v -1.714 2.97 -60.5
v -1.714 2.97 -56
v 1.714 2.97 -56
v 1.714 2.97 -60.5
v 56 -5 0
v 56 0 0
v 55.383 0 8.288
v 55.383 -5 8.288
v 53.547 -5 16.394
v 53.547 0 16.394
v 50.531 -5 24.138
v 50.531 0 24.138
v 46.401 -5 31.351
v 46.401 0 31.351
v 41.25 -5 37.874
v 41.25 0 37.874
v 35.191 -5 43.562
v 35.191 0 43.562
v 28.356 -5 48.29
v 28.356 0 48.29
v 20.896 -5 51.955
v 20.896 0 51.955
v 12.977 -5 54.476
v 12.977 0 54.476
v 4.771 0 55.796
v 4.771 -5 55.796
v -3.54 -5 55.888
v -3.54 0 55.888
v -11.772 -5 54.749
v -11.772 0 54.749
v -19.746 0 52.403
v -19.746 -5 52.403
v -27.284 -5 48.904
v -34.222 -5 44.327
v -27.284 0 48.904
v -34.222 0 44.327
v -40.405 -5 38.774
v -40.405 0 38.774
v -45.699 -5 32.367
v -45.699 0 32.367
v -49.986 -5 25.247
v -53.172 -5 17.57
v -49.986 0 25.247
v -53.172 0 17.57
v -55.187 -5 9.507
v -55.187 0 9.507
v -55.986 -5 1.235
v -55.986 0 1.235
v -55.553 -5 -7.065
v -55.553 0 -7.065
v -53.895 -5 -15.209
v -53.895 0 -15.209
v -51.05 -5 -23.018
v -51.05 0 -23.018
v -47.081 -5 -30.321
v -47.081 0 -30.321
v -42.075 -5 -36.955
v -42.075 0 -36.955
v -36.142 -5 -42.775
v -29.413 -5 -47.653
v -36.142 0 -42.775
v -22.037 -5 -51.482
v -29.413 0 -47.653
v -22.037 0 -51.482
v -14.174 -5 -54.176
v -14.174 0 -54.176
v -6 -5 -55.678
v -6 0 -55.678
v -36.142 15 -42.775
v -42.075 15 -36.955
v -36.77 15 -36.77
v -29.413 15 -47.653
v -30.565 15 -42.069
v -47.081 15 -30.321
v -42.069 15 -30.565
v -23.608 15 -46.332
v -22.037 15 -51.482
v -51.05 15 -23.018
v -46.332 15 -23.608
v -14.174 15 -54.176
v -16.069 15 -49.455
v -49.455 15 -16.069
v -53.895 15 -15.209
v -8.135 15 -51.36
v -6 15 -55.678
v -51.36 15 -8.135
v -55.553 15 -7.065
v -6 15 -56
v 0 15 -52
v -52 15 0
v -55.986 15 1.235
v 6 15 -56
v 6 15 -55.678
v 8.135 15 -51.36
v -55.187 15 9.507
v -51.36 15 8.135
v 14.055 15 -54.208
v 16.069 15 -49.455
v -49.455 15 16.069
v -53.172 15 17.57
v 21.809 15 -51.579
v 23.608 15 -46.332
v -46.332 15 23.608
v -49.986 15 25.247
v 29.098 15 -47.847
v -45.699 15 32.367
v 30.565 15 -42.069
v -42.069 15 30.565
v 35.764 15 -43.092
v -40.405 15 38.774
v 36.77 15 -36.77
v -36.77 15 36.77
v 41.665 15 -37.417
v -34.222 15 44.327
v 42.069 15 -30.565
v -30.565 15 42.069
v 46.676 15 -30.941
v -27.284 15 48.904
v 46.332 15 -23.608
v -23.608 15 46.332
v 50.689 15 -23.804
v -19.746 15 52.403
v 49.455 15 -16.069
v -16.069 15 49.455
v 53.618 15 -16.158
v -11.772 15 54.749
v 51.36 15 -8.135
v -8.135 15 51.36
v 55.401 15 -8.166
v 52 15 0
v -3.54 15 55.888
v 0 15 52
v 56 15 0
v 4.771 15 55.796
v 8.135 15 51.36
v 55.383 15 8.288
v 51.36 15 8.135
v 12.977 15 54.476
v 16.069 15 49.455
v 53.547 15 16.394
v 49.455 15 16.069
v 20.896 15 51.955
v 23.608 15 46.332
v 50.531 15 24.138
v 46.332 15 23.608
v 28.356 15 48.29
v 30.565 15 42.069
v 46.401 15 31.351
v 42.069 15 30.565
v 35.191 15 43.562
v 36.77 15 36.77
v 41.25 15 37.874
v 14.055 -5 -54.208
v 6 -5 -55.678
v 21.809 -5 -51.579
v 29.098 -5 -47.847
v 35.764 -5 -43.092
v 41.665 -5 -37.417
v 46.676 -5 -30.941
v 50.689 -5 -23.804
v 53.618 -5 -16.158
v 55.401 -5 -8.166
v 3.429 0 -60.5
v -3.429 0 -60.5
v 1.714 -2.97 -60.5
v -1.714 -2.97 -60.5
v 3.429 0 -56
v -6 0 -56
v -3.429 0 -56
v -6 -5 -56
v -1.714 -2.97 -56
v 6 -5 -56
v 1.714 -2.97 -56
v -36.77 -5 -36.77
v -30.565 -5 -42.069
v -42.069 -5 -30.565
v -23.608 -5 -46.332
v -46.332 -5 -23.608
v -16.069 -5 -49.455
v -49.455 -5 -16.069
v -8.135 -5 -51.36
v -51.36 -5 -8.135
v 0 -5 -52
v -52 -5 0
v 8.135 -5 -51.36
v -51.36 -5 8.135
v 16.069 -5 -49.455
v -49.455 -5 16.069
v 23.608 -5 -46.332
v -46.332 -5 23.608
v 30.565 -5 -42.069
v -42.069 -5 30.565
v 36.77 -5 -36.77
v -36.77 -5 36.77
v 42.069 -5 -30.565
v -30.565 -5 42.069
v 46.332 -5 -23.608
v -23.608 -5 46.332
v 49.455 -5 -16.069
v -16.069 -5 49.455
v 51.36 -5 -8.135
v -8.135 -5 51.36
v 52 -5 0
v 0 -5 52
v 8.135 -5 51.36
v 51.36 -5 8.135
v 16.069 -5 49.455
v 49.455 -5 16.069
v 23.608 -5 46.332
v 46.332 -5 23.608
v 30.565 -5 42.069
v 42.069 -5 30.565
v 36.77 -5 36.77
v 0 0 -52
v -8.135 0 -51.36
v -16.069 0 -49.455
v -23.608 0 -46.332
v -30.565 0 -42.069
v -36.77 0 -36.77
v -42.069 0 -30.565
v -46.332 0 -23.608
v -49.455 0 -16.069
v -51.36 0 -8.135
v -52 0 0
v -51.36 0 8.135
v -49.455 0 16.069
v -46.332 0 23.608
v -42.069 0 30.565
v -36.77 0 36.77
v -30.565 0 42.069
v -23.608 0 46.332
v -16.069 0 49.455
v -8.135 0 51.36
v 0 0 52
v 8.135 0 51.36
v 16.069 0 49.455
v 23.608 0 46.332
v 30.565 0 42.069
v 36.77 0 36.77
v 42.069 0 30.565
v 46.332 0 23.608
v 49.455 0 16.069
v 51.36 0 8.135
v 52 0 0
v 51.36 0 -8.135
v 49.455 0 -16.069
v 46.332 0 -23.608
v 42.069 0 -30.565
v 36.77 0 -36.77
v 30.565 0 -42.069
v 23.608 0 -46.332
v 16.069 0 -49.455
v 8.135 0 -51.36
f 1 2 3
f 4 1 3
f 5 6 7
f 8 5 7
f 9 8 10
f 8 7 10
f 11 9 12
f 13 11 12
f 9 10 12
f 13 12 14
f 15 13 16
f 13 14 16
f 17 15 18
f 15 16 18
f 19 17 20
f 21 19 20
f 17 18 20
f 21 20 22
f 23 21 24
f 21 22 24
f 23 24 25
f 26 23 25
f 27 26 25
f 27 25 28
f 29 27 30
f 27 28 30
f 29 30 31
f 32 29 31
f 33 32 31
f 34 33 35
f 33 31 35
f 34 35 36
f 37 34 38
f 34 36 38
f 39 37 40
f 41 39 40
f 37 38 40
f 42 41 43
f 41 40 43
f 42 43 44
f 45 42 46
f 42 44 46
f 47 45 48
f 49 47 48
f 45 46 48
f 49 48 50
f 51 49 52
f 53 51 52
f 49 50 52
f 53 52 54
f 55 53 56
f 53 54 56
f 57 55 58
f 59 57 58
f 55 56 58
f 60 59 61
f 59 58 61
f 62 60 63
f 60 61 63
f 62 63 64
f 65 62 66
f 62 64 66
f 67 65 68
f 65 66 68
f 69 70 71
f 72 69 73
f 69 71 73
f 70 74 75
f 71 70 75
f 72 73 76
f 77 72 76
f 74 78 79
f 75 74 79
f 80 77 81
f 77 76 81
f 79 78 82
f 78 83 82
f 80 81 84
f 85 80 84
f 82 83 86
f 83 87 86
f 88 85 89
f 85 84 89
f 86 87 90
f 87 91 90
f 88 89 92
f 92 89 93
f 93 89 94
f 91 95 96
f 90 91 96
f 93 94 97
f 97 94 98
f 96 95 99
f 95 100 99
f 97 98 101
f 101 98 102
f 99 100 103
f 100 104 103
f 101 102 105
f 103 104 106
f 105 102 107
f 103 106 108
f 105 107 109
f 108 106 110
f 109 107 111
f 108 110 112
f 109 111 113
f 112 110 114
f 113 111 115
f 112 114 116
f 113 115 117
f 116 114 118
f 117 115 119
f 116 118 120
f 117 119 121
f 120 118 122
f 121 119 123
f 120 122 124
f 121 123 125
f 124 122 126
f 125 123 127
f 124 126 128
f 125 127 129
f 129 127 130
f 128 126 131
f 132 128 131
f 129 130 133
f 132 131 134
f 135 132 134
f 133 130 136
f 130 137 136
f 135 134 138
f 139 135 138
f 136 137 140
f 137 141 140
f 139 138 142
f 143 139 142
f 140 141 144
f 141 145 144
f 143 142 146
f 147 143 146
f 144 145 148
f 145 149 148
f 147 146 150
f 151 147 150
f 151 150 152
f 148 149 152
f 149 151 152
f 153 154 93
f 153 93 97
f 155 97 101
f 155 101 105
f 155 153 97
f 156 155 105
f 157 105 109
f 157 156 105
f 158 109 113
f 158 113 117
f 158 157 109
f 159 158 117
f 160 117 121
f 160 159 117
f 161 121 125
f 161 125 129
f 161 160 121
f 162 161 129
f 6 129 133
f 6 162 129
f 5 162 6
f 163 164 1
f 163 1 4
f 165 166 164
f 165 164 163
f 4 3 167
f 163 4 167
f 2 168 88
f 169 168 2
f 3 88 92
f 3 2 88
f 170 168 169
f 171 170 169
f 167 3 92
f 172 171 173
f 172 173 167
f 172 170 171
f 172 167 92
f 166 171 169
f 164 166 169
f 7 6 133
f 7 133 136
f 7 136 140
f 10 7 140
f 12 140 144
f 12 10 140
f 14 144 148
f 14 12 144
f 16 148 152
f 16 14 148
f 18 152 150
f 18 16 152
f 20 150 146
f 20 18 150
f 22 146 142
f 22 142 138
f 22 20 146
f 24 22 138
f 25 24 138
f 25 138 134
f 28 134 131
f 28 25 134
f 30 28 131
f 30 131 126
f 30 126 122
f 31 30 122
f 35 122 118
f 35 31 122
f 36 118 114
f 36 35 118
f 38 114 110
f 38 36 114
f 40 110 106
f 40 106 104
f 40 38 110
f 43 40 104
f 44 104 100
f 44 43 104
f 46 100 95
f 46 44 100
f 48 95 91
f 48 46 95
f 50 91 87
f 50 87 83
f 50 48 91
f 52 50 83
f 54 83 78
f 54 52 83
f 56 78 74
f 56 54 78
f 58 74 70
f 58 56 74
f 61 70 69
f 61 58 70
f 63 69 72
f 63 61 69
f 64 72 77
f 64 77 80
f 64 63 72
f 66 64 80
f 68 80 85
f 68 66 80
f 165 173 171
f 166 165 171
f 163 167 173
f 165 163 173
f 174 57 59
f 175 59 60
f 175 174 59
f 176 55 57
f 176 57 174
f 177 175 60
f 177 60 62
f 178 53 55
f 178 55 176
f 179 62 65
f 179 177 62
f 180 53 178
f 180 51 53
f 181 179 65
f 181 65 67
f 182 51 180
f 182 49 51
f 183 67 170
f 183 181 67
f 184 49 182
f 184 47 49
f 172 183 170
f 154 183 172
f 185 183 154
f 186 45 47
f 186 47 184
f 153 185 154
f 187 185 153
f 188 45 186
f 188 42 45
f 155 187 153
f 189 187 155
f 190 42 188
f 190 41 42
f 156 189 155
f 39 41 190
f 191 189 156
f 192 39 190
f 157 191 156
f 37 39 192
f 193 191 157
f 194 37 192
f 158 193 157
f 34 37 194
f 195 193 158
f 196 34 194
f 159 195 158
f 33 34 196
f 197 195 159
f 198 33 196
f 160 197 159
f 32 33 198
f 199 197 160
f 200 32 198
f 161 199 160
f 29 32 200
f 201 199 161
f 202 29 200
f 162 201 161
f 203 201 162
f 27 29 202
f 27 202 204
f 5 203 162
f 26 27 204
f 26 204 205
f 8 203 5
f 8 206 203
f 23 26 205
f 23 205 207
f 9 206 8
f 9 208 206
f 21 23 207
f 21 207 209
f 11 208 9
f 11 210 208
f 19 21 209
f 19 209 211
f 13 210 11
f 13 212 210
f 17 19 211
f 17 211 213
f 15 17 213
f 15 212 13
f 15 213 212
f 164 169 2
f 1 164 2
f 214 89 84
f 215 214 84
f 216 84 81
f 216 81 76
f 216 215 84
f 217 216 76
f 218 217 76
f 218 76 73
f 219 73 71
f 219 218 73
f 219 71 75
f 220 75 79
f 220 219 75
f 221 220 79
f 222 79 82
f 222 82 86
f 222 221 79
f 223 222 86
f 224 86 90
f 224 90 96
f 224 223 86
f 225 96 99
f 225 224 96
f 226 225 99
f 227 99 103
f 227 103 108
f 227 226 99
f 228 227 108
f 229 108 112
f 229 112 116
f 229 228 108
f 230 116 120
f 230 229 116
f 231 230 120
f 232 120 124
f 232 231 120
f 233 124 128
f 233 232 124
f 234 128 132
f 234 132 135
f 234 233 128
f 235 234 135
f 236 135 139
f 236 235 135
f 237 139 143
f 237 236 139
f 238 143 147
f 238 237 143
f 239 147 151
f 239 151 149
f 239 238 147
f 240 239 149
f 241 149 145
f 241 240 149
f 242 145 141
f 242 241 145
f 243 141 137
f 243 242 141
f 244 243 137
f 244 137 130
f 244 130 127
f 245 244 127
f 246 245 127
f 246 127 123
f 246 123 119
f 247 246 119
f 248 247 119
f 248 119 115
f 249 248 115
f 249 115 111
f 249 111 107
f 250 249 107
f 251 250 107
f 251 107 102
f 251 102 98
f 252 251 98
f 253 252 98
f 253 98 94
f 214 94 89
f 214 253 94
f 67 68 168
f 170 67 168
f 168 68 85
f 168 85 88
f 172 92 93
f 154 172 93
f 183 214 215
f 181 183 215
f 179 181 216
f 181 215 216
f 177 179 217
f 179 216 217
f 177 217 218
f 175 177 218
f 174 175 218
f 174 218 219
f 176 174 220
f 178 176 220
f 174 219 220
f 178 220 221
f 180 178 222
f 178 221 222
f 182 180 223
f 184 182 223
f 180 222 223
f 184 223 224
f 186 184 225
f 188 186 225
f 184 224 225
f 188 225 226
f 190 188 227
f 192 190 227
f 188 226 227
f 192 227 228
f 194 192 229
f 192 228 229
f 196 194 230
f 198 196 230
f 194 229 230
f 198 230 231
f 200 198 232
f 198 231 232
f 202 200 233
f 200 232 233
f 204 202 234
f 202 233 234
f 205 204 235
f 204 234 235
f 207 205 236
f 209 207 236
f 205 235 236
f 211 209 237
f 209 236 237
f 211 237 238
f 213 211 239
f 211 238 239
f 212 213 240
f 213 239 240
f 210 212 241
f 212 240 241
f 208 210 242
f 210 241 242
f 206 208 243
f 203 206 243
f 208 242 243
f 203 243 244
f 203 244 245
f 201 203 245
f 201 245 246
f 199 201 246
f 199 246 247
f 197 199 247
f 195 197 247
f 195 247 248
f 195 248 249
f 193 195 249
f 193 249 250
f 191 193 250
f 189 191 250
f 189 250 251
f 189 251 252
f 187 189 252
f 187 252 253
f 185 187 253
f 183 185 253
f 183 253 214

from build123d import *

# Parameters (mm, degrees)
F1_DEPTH      = 15
F1_DEPTH_BACK = 5
F2_DEPTH      = 5
F2_DEPTH_BACK = 15
F4_DEPTH      = 4.5


with BuildPart() as f1:
    # F0 (on Front) → F1 (new body, two sides)
    with BuildSketch(Plane.XZ) as f1_sk:
        with BuildLine():
            Line((-6, -52), (0, -52))
            Line((0, -52), (6, -52))
            Line((6, -52), (6, -55.6776436283))
            ThreePointArc((6, -55.6776436283), (41.665333312, -37.4165738677), (56, 0))
            ThreePointArc((56, 0), (-37.4165738677, 41.665333312), (-6, -55.6776436283))
            Line((-6, -55.6776436283), (-6, -52))
        make_face()
        with BuildLine():
            ThreePointArc((0, -52), (-36.7695526217, 36.7695526217), (52, 0))
            ThreePointArc((52, 0), (36.7695526217, -36.7695526217), (0, -52))
        make_face(mode=Mode.SUBTRACT)
        with BuildLine():
            Line((6, -52), (0, -52))
            Line((0, -52), (-6, -52))
            Line((-6, -52), (-6, -55.6776436283))
            ThreePointArc((-6, -55.6776436283), (-3.0043266147, -55.919352836), (0, -56))
            ThreePointArc((0, -56), (3.0043266147, -55.919352836), (6, -55.6776436283))
            Line((6, -55.6776436283), (6, -52))
        make_face()
    extrude(amount=-F1_DEPTH)
    extrude(f1_sk.sketch, amount=F1_DEPTH_BACK)

    # F0 (on Front) → F2 (join, two sides)
    with BuildSketch(Plane.XZ) as f2_sk:
        with BuildLine():
            Line((6, -56), (6, -55.6776436283))
            ThreePointArc((6, -55.6776436283), (3.0043266147, -55.919352836), (0, -56))
            Line((0, -56), (6, -56))
        make_face()
        with BuildLine():
            ThreePointArc((0, -56), (-3.0043266147, -55.919352836), (-6, -55.6776436283))
            Line((-6, -55.6776436283), (-6, -56))
            Line((-6, -56), (0, -56))
        make_face()
    extrude(amount=F2_DEPTH)
    extrude(f2_sk.sketch, amount=-F2_DEPTH_BACK)

    # F3 (on face) → F4 (join)
    with BuildSketch(Plane(origin=(0, 0, -56), x_dir=(1, 0, 0), z_dir=(0, 0, -1))):
        Polygon((-1.7145, 2.9696011096), (-3.429, 0), (-1.7145, -2.9696011096), (1.7145, -2.9696011096), (3.429, 0), (1.7145, 2.9696011096), align=None)
    extrude(amount=F4_DEPTH)


solid = f1.part
